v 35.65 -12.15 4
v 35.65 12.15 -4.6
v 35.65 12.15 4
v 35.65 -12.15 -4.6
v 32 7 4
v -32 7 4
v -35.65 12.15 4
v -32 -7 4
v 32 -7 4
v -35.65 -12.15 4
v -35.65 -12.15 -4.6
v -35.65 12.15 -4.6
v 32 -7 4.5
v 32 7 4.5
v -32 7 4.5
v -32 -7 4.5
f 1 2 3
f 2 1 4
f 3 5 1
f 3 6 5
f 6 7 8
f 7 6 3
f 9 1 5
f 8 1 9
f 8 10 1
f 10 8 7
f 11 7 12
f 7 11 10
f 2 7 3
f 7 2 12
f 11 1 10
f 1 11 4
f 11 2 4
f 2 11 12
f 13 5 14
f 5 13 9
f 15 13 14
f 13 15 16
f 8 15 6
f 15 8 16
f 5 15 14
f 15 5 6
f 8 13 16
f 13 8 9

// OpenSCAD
// Parameters
width_mm = 71.3; //[35.65:142.6:0.1]
height_mm = 24.3; //[12.15:48.6:0.1]
thickness_mm = 8; //[4:16:0.1]
include_pcb = 1; //[0:1:1]
pcb_thickness_mm = 1.6; //[0.8:3.2:0.1]
pcb_overlap_mm = 1; //[0.5:2:0.1]
include_aperture = 1; //[0:1:1]
aperture_width_mm = 64; //[32:70:0.1]
aperture_height_mm = 14; //[7:22:0.1]
aperture_depth_mm = 1.2; //[0.5:3:0.1]
hole_cut_extra_mm = 0.5; //[0.2:2:0.1]
include_mounting_features = 0; //[0:1:1]
mounting_hole_diameter_mm = 3.2; //[0:6.4:0.1]
mounting_hole_edge_offset_x_mm = 2.5; //[1:10:0.1]
mounting_hole_edge_offset_y_mm = 2.5; //[1:10:0.1]
display_window_thickness_mm = 0.8; //[0.3:2:0.1]
display_window_overlap_mm = 0.6; //[0.3:1.5:0.1]

// Display module - complete geometry
module display() {
  color([0.85, 0.85, 0.8]) {
    // Main body
    cube([width_mm, height_mm, thickness_mm], center=true);
    
    // PCB backing plate
    if (include_pcb) {
      translate([0, 0, -thickness_mm/2 - pcb_thickness_mm/2 + pcb_overlap_mm])
        cube([width_mm, height_mm, pcb_thickness_mm], center=true);
    }
    
    // Active area aperture
    if (include_aperture) {
      translate([0, 0, thickness_mm/2 - aperture_depth_mm/2 + hole_cut_extra_mm/2])
        cube([aperture_width_mm, aperture_height_mm, aperture_depth_mm + hole_cut_extra_mm], center=true);
    }
    
    // Display window
    translate([0, 0, thickness_mm/2 - display_window_thickness_mm/2 - display_window_overlap_mm])
      cube([aperture_width_mm, aperture_height_mm, display_window_thickness_mm], center=true);
  }
}

// Mod - complete geometry
module mod() {
  // Placeholder for additional components or modifications
  // Currently, it is the same as the display module
  display();
}

// Assembly
module assembly() {
  display();
  mod();
}

assembly();
